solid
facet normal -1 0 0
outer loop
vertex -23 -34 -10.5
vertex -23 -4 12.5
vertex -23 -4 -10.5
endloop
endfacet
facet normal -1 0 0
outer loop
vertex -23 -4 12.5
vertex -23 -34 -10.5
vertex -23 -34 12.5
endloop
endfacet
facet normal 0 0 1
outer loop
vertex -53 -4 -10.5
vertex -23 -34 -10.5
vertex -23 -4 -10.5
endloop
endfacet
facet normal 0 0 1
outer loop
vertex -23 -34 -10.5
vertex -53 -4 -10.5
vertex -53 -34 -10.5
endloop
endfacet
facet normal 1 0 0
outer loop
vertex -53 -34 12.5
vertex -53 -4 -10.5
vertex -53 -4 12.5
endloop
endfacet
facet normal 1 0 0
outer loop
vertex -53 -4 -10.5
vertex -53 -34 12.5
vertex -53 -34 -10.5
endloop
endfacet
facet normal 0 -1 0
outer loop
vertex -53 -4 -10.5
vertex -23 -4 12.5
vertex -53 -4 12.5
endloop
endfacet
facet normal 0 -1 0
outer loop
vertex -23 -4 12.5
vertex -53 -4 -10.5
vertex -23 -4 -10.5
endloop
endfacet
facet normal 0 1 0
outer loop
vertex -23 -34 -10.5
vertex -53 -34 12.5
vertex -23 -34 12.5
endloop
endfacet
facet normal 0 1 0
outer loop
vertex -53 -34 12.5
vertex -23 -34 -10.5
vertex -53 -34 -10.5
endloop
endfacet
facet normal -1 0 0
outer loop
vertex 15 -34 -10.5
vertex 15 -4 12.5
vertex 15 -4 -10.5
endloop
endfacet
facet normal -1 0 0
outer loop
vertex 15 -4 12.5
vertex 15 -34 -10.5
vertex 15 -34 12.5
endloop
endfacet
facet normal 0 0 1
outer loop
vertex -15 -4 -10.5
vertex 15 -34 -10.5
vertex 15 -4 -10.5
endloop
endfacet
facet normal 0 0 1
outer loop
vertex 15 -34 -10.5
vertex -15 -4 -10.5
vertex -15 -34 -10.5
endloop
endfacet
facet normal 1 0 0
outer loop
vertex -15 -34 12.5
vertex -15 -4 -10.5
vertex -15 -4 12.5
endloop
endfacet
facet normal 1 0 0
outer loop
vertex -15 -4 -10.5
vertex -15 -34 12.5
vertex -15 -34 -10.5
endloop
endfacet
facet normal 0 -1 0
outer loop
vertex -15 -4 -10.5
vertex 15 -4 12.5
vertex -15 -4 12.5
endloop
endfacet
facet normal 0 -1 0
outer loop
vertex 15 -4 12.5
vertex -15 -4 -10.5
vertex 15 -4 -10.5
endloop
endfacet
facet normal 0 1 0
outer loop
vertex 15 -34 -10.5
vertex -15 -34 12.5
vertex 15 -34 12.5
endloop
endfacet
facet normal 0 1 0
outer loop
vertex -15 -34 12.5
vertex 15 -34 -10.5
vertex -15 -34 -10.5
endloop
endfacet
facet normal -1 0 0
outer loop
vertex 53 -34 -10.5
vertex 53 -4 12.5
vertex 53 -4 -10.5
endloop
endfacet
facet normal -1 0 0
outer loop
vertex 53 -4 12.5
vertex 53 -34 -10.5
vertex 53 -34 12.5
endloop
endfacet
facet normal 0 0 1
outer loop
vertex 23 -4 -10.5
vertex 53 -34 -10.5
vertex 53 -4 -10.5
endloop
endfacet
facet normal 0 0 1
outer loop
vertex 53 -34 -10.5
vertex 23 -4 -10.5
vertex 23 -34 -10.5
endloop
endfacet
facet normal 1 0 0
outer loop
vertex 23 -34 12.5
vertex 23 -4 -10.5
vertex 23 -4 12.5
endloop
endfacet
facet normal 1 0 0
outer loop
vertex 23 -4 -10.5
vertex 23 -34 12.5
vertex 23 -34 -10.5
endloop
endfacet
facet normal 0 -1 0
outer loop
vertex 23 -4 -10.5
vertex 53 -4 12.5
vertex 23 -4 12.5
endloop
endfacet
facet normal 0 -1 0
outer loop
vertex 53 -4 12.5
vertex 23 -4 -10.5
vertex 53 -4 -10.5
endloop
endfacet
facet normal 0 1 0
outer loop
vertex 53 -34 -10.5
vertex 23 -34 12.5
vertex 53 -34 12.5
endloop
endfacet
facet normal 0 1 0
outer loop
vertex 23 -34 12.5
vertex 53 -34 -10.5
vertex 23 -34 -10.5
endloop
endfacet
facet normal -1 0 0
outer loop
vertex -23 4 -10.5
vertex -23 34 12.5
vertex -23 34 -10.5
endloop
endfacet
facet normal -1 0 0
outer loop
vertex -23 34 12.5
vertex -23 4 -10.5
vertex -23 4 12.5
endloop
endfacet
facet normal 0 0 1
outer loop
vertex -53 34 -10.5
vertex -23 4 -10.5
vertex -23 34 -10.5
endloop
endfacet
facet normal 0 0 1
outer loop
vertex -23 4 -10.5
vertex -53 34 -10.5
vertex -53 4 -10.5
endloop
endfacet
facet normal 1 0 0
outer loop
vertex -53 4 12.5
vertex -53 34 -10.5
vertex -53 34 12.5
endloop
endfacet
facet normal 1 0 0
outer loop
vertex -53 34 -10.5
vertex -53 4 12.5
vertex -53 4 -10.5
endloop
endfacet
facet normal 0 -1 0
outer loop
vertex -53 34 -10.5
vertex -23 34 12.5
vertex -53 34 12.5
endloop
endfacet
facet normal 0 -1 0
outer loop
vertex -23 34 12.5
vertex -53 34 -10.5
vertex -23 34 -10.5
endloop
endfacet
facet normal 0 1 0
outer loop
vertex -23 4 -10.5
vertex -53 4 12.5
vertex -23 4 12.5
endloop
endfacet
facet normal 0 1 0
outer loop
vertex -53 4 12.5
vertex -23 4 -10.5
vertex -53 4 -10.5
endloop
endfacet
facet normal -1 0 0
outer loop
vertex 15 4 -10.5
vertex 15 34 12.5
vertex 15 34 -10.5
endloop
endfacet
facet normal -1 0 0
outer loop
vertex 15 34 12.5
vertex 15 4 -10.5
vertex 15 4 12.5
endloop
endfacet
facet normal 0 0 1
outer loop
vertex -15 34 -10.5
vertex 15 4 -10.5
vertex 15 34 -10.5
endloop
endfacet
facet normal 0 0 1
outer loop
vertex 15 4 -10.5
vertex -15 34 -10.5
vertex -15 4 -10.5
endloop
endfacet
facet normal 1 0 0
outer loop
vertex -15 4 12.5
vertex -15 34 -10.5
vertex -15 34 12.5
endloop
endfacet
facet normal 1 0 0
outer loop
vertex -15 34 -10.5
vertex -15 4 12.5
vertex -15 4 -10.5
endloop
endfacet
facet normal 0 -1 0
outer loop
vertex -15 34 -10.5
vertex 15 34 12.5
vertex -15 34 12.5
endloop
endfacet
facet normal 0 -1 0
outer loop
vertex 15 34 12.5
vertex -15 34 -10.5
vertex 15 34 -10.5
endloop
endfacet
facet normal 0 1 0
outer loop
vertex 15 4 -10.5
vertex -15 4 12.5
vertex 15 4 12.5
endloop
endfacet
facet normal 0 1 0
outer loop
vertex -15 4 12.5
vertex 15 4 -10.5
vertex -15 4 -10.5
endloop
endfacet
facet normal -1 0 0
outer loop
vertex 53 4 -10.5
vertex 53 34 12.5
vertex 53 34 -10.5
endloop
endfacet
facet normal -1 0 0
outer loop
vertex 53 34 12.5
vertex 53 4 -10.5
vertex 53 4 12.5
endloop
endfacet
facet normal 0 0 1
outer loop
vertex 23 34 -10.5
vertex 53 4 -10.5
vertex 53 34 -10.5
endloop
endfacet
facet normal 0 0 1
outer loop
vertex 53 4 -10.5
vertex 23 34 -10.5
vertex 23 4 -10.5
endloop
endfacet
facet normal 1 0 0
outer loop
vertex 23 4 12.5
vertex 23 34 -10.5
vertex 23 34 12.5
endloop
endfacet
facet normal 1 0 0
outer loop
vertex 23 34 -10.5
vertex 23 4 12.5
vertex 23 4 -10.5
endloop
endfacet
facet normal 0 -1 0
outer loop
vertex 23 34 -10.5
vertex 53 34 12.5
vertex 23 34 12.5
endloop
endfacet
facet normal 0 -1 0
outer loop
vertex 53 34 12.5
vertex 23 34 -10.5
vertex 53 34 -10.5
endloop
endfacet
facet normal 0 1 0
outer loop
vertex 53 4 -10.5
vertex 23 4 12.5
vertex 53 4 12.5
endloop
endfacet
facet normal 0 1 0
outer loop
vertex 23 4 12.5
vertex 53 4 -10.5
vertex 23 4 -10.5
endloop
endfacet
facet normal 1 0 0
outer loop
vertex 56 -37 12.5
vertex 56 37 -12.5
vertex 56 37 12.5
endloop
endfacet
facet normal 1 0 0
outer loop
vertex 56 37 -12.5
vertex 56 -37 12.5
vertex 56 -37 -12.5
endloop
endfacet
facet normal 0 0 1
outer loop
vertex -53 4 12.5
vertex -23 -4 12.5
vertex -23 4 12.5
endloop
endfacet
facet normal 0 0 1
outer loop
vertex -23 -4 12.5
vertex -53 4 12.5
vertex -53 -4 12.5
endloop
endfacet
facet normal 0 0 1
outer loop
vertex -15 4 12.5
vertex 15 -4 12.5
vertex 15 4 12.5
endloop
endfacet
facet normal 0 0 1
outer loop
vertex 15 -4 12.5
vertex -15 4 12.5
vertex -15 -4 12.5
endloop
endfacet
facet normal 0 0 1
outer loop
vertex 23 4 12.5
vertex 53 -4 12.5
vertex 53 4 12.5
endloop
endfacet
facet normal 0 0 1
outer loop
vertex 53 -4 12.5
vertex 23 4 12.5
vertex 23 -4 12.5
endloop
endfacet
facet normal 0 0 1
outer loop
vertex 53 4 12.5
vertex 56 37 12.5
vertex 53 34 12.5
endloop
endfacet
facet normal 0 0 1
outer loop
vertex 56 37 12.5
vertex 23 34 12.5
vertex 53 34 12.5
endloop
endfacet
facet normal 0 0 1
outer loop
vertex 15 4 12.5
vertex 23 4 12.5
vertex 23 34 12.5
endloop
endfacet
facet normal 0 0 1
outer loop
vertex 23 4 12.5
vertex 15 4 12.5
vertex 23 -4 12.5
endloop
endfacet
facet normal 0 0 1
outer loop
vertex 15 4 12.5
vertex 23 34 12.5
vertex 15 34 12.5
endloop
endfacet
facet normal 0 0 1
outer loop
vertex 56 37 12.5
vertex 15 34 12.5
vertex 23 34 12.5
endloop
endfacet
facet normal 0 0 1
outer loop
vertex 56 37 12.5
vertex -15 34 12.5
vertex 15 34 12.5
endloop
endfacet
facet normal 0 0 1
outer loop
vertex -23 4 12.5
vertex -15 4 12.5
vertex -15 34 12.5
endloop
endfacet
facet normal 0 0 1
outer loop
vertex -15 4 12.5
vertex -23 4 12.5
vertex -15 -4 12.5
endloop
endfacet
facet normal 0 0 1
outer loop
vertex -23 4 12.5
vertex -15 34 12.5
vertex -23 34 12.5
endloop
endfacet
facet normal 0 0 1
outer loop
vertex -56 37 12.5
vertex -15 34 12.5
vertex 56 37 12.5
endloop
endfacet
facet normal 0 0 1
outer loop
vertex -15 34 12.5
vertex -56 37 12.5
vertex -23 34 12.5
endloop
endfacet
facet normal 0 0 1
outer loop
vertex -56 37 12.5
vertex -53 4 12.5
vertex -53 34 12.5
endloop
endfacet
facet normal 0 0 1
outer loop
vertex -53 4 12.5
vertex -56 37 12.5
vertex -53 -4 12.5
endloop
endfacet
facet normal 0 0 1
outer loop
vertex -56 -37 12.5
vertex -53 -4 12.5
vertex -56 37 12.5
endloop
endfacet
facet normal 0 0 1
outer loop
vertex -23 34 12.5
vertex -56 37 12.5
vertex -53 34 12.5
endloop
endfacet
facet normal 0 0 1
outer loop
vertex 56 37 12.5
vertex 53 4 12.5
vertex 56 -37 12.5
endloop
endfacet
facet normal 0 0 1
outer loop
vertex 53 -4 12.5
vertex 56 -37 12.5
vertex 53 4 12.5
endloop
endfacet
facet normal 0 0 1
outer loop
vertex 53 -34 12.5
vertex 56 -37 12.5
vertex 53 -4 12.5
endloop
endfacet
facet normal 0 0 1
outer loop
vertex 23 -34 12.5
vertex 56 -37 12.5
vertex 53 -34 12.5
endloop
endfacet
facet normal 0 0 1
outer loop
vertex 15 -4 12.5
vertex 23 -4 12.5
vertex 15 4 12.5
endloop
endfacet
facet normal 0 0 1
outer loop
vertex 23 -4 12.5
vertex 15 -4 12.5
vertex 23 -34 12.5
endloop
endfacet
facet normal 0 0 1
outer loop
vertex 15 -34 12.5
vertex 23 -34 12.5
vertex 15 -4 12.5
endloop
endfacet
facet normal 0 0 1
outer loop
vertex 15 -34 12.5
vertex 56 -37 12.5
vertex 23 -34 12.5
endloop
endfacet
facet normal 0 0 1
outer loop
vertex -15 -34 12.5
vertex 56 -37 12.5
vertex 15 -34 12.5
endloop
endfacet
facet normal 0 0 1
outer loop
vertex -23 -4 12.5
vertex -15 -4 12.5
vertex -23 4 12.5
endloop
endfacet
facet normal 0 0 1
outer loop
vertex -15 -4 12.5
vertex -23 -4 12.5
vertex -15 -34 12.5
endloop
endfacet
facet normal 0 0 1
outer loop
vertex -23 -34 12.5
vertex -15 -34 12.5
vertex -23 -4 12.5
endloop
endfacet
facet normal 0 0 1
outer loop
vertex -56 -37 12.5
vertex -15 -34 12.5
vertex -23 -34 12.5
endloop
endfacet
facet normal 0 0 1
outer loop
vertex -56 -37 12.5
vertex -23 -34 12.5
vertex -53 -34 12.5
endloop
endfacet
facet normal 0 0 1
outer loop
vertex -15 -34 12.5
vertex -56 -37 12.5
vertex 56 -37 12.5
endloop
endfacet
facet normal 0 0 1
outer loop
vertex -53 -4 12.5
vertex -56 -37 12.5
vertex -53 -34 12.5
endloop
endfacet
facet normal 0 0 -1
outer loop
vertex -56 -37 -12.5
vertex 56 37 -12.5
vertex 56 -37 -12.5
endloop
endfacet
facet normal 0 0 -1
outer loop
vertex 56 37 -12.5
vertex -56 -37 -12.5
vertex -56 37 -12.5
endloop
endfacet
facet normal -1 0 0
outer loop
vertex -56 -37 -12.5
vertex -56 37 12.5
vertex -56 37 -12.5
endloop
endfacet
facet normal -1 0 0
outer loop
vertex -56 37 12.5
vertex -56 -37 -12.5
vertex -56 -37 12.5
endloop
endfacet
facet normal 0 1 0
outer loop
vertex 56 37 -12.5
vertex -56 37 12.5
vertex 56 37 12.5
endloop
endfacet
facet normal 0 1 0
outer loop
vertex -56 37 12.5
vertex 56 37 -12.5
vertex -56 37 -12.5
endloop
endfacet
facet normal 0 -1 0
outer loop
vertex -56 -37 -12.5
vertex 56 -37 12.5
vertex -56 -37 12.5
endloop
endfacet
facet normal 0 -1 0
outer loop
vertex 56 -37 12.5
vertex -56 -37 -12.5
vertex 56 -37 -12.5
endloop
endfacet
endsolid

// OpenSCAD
$fn = 32;

// ----------------------------------------------------------------------
// Pocket plate 112 x 74 x 25
// 2 x 3 pockets 30 mm square, 23 mm deep
// ----------------------------------------------------------------------

// --- parameters (mm) ---
thickness = 25;  // plate thickness
floor_t = 2;     // material left under each pocket
pocket = 30;     // pocket side length
pitch_x = 38;    // pocket pitch along X
pitch_y = 38;    // pocket pitch along Y
cols = 3;        // pockets per row
rows = 2;        // rows of pockets

// --- derived feature positions (mm) ---
depth = thickness - floor_t;        // = 23   pocket depth, down to the floor
span_x = (cols - 1) * pitch_x;      // = 76   distance between outer pockets
span_y = (rows - 1) * pitch_y;      // = 38   distance between outer pocket rows
origin_x = -span_x / 2;             // = -38   X of the first pocket
origin_y = -span_y / 2;             // = -19   Y of the first pocket
plate = [span_x + pocket + 6, span_y + pocket + 6, thickness];  // = [112, 74, 25]   overall size: pockets plus 3 mm of wall on each side
feature_centers = [
  [origin_x + 0 * pitch_x, origin_y + 0 * pitch_y],
  [origin_x + 1 * pitch_x, origin_y + 0 * pitch_y],
  [origin_x + 2 * pitch_x, origin_y + 0 * pitch_y],
  [origin_x + 0 * pitch_x, origin_y + 1 * pitch_y],
  [origin_x + 1 * pitch_x, origin_y + 1 * pitch_y],
  [origin_x + 2 * pitch_x, origin_y + 1 * pitch_y]
];   // pocket centres, used verbatim by the cutter loop

// plate outline, then one pocket per centre in feature_centers
difference() {
  cube(plate, center = true);
  for (centre = feature_centers)
    translate([centre[0] - pocket / 2, centre[1] - pocket / 2, plate[2] / 2 - depth])
      cube([pocket, pocket, depth + 1]);  // centred on the declared pocket centre
}
